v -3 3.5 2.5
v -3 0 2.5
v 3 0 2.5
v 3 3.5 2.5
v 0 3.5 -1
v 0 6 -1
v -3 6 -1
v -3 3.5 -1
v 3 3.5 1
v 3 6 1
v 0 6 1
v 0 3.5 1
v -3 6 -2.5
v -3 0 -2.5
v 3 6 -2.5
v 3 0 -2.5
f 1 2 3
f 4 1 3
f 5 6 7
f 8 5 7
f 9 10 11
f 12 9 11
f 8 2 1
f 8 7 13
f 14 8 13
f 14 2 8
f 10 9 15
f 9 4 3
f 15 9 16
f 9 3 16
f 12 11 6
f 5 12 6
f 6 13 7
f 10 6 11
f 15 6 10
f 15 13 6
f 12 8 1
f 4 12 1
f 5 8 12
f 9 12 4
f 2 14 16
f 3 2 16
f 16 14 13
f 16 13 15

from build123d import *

# Parameters (mm, degrees)
SKETCH1_W           = 6
SKETCH1_H           = 5
BOSS_EXTRUDE1_DEPTH = 6
CUT_EXTRUDE1_DEPTH  = 2.5


with BuildPart() as part:
    # Sketch1 → Boss-Extrude1 (new body)
    with BuildSketch(Plane(origin=(0, 0, 0), x_dir=(1, 0, 0), z_dir=(0, 1, 0))):
        Rectangle(SKETCH1_W, SKETCH1_H)
    extrude(amount=BOSS_EXTRUDE1_DEPTH)

    # Sketch2 → Cut-Extrude1 (cut)
    with BuildSketch(Plane(origin=(0, 6, 0), x_dir=(1, 0, 0), z_dir=(0, 1, 0))):
        Polygon((3, -1), (0, -1), (0, 1), (-3, 1), (-3, -2.5), (3, -2.5), align=None)
    extrude(amount=-CUT_EXTRUDE1_DEPTH, mode=Mode.SUBTRACT)


solid = part.part
